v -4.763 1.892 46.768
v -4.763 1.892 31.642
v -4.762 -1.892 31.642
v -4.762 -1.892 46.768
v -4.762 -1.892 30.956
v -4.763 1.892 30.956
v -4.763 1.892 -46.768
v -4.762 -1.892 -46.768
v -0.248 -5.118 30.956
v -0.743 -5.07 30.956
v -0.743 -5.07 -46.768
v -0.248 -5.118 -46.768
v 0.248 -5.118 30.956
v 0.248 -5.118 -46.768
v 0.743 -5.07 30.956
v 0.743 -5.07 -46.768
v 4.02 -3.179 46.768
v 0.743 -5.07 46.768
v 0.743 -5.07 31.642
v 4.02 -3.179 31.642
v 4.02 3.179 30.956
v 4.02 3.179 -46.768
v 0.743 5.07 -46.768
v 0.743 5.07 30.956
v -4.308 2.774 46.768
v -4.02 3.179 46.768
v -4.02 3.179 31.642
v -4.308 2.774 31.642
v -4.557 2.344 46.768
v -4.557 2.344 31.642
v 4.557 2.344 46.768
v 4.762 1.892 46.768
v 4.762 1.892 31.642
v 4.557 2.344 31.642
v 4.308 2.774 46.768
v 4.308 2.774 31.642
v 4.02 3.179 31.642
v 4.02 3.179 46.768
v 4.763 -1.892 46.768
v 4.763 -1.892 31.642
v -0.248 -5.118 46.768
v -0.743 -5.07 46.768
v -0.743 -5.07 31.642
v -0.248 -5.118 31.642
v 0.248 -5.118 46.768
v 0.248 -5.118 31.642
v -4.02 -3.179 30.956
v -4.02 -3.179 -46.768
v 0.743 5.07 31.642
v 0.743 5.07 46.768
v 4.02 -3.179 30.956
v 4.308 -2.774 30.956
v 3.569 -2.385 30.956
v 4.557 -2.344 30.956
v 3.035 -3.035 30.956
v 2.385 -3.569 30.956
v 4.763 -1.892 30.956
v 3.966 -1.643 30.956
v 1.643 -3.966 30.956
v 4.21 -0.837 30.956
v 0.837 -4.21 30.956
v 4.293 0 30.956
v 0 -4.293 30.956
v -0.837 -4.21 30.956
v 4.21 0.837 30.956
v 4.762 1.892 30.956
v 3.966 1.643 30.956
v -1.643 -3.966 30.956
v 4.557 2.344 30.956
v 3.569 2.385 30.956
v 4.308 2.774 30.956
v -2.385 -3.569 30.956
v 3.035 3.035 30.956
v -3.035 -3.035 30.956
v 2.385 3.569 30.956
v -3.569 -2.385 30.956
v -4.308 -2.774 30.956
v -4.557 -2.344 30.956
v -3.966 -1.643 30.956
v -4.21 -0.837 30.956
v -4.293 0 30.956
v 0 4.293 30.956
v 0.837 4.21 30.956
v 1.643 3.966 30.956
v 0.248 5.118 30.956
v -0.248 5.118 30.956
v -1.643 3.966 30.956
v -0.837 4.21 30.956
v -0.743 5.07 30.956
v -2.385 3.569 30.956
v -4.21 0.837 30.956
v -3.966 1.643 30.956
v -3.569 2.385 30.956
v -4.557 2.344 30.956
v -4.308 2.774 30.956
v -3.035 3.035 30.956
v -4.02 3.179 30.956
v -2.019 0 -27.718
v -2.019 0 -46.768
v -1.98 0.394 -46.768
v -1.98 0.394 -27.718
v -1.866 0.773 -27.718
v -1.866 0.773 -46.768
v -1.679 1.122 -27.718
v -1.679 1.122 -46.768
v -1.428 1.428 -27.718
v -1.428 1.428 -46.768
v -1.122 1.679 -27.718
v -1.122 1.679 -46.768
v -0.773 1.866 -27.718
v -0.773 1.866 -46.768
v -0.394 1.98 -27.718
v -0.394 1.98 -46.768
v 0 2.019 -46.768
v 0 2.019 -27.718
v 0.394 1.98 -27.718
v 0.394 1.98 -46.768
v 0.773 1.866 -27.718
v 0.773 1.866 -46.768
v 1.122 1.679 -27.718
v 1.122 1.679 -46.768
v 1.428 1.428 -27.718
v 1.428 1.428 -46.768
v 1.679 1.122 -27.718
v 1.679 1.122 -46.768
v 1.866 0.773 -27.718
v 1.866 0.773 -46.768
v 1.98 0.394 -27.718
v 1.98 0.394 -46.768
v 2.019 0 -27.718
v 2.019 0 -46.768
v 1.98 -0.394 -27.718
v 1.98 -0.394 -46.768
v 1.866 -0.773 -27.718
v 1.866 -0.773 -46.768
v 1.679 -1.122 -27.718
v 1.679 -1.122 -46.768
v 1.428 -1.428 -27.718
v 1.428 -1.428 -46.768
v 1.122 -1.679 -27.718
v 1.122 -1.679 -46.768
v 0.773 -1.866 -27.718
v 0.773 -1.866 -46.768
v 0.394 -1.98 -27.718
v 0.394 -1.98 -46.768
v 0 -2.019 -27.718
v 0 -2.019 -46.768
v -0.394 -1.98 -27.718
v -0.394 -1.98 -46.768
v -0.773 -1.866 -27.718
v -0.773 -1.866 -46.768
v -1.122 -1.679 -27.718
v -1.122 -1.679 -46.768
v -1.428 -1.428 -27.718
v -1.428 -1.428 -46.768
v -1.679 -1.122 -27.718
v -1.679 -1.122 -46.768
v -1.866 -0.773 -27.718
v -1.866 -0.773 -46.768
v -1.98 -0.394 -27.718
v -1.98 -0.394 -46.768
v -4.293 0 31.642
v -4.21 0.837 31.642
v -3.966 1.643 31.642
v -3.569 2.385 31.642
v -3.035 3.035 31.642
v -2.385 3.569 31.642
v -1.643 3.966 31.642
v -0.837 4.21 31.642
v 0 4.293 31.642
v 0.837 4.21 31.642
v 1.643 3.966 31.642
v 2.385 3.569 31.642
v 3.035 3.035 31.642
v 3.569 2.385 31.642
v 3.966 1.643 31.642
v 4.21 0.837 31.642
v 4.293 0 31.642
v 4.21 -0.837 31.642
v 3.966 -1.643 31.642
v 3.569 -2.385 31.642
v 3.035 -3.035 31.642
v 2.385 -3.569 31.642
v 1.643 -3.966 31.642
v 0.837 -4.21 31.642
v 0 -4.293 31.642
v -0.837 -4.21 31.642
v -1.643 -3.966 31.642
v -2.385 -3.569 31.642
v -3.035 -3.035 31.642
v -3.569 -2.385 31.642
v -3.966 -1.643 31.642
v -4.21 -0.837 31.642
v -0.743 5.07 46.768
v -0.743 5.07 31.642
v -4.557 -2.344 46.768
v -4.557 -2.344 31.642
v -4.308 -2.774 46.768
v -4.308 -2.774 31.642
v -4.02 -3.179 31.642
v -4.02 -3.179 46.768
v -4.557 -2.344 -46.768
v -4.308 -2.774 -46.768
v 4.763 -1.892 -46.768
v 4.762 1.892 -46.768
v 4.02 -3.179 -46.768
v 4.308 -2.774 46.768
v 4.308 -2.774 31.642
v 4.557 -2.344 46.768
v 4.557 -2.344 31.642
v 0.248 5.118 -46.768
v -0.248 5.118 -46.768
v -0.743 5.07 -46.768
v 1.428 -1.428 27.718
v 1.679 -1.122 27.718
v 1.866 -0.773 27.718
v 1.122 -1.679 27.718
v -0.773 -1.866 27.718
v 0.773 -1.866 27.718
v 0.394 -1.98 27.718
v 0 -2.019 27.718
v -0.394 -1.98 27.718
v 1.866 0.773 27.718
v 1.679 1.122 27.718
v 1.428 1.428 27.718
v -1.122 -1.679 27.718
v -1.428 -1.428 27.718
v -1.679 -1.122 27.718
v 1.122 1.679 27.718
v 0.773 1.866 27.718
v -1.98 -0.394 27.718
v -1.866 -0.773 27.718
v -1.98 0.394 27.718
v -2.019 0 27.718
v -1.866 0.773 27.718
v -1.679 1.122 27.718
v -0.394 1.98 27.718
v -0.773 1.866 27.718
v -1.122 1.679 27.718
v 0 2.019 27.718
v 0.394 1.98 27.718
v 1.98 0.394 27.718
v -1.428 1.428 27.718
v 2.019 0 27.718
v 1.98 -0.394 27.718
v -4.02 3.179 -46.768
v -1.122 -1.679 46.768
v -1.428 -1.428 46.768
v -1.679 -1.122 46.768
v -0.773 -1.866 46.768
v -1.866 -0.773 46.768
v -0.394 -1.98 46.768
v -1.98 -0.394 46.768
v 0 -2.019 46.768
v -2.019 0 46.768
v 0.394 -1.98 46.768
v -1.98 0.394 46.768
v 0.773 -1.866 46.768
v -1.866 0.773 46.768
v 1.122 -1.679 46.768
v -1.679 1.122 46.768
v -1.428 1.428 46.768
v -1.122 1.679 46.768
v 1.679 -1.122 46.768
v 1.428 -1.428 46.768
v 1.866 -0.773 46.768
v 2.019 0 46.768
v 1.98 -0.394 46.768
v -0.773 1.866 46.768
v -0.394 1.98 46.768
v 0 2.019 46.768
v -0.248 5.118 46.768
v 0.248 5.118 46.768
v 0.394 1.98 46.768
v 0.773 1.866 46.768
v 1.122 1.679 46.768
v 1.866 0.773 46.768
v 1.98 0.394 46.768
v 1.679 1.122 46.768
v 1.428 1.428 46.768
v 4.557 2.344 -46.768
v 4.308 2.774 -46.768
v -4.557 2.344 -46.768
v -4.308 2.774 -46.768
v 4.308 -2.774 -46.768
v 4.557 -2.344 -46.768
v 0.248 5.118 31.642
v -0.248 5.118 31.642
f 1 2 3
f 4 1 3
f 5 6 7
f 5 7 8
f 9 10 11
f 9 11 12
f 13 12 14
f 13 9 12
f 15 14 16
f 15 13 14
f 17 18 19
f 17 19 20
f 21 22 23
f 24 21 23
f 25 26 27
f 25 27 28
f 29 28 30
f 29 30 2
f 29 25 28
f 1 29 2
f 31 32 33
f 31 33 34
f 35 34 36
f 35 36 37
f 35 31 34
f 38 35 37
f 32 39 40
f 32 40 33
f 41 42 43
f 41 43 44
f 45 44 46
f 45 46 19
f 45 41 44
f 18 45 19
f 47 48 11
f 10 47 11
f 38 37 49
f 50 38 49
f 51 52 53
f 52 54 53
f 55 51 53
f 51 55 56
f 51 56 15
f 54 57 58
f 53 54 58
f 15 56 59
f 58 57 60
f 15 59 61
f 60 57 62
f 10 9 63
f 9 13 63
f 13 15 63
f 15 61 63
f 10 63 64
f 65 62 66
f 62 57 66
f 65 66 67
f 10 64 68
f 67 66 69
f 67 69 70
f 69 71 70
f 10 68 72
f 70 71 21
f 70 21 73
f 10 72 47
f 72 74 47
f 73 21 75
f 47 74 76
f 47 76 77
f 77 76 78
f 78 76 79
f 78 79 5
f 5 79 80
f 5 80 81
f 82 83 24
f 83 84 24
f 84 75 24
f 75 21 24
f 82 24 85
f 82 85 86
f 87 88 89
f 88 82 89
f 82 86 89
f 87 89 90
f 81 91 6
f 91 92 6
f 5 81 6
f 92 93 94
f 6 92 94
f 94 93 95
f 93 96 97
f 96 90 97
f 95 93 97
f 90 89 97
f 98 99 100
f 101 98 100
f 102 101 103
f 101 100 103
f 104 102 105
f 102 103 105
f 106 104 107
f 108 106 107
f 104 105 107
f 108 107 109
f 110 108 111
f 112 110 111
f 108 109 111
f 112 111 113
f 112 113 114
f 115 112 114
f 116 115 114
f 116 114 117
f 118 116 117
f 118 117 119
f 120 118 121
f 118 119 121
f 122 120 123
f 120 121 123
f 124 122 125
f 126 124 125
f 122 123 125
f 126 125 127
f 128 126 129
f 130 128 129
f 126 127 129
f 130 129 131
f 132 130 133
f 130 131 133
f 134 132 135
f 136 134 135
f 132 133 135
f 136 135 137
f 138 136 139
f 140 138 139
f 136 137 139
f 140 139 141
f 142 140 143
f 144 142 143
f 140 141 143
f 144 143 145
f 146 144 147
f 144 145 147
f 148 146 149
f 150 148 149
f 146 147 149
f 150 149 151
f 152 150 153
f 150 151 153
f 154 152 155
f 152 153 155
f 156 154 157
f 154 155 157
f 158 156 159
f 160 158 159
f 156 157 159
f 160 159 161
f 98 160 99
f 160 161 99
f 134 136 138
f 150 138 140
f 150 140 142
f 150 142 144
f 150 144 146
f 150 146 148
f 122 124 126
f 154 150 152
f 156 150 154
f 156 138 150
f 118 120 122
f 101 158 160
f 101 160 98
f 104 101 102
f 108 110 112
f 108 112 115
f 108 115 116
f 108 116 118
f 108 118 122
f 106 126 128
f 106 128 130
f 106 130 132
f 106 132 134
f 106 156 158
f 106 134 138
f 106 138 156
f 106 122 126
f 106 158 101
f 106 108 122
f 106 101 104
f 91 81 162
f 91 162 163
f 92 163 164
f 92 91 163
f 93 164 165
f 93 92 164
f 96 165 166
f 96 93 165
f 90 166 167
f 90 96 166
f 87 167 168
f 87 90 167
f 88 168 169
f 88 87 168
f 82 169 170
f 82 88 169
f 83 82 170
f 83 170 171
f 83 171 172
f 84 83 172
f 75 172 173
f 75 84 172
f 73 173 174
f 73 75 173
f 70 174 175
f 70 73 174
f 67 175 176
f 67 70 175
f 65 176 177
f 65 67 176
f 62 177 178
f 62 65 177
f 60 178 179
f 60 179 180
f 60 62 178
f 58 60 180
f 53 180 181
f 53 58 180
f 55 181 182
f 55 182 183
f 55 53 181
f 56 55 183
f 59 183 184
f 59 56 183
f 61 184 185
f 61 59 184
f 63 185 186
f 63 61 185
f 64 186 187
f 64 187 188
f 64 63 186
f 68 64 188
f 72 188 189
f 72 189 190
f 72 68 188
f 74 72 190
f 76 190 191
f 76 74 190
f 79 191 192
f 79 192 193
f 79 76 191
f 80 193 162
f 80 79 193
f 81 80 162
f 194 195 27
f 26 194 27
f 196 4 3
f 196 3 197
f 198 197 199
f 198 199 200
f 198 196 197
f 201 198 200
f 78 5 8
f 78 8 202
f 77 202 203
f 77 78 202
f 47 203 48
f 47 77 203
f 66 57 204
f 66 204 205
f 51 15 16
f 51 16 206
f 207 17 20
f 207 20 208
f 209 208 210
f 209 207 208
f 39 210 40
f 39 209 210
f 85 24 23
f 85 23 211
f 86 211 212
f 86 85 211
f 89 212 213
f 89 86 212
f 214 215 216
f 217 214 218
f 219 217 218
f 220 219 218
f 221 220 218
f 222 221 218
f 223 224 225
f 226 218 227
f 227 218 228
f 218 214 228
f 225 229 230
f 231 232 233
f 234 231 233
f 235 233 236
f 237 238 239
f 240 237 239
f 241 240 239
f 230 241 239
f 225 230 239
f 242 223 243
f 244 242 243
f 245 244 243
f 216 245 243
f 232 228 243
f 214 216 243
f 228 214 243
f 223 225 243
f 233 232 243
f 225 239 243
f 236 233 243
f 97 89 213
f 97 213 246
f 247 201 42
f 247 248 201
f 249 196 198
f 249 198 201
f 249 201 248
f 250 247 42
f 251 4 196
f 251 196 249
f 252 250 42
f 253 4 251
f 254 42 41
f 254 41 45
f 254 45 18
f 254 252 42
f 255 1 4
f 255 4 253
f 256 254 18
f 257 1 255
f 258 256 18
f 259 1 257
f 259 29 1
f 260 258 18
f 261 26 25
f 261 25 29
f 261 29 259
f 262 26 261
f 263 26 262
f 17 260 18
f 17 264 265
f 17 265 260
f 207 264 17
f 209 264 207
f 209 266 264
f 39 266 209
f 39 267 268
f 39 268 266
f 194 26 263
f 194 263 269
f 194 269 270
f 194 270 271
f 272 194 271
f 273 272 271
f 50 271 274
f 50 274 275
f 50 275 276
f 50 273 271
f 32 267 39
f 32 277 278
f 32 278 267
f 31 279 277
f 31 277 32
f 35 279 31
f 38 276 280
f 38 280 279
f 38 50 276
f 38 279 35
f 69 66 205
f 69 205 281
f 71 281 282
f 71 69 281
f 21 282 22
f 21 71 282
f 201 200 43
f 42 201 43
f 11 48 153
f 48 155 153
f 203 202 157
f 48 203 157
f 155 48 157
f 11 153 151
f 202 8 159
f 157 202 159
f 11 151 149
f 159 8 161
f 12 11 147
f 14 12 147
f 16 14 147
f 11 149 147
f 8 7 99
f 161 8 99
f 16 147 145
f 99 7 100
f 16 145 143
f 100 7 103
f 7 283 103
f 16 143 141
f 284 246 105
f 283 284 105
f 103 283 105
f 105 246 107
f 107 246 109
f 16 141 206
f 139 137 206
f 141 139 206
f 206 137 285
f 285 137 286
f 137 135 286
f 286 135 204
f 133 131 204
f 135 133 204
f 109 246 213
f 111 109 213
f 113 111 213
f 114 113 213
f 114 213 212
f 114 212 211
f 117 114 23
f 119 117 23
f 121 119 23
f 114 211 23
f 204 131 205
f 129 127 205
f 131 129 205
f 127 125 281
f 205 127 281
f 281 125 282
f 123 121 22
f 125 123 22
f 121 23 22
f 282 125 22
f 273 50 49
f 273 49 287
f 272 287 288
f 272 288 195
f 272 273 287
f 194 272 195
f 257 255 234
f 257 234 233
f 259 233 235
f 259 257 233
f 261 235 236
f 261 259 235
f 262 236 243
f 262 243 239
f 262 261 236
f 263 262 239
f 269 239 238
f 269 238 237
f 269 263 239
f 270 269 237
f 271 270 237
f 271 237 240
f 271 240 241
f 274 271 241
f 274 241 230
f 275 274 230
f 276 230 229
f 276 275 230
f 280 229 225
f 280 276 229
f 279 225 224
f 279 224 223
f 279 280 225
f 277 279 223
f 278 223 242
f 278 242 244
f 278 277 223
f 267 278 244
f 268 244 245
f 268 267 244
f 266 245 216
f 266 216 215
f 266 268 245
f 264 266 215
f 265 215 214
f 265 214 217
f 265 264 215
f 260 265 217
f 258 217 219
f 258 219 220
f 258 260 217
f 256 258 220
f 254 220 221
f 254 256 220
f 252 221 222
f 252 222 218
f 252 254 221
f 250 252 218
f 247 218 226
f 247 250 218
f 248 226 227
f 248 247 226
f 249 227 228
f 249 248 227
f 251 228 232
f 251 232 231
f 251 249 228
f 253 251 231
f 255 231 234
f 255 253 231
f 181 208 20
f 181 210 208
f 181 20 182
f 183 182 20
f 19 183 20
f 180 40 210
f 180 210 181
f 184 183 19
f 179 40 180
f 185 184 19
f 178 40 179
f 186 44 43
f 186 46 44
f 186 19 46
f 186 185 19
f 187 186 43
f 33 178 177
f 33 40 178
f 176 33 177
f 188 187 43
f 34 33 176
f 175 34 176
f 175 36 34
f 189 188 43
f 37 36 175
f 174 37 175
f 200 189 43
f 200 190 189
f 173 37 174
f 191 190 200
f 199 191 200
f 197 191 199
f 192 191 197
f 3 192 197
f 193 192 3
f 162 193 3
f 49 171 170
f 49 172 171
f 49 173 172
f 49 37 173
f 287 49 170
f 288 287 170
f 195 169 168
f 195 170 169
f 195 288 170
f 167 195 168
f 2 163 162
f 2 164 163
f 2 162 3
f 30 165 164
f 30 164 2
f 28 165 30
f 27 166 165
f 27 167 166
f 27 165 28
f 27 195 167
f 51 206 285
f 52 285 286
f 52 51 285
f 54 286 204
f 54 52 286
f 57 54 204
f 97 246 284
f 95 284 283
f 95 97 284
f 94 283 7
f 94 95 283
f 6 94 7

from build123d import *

# Parameters (mm, degrees)
BOSS_EXTRUDE1_DEPTH = 46.76775
SKETCH2_R           = 2.0193
CUT_EXTRUDE1_DEPTH  = 19.05
SKETCH4_R           = 6.35
SKETCH4_R_2         = 4.2926
CUT_EXTRUDE2_DEPTH  = 0.6858


with BuildPart() as part:
    # Sketch1 → Boss-Extrude1 (new, symmetric)
    with BuildSketch(Plane.XY):
        with BuildLine():
            ThreePointArc((4.7625, 1.891713919), (4.43790388, 2.562225), (4.019522311, 3.178589026))
            Line((4.019522311, 3.178589026), (0.742977689, 5.070302945))
            ThreePointArc((0.742977689, 5.070302945), (0, 5.12445), (-0.742977689, 5.070302945))
            Line((-0.742977689, 5.070302945), (-4.019522311, 3.178589026))
            ThreePointArc((-4.019522311, 3.178589026), (-4.43790388, 2.562225), (-4.7625, 1.891713919))
            Line((-4.7625, 1.891713919), (-4.7625, -1.891713919))
            ThreePointArc((-4.7625, -1.891713919), (-4.43790388, -2.562225), (-4.019522311, -3.178589026))
            Line((-4.019522311, -3.178589026), (-0.742977689, -5.070302945))
            ThreePointArc((-0.742977689, -5.070302945), (0, -5.12445), (0.742977689, -5.070302945))
            Line((0.742977689, -5.070302945), (4.019522311, -3.178589026))
            ThreePointArc((4.019522311, -3.178589026), (4.43790388, -2.562225), (4.7625, -1.891713919))
            Line((4.7625, -1.891713919), (4.7625, 1.891713919))
        make_face()
    extrude(amount=BOSS_EXTRUDE1_DEPTH, both=True)

    # Sketch2 → Cut-Extrude1 (cut)
    with BuildSketch(Plane(origin=(0, 0, -46.76775), x_dir=(-1, 0, 0), z_dir=(0, 0, -1))):
        Circle(SKETCH2_R)
    cut_extrude1 = extrude(amount=-CUT_EXTRUDE1_DEPTH, mode=Mode.SUBTRACT)

    # Mirror1: Cut-Extrude1 across plane
    add(cut_extrude1.mirror(Plane.XY), mode=Mode.SUBTRACT)

    # Sketch4 → Cut-Extrude2 (cut)
    with BuildSketch(Plane(origin=(0, 0, 30.95625), x_dir=(-1, 0, 0), z_dir=(0, 0, -1))):
        Circle(SKETCH4_R)
        Circle(SKETCH4_R_2, mode=Mode.SUBTRACT)
    extrude(amount=-CUT_EXTRUDE2_DEPTH, mode=Mode.SUBTRACT)


solid = part.part
